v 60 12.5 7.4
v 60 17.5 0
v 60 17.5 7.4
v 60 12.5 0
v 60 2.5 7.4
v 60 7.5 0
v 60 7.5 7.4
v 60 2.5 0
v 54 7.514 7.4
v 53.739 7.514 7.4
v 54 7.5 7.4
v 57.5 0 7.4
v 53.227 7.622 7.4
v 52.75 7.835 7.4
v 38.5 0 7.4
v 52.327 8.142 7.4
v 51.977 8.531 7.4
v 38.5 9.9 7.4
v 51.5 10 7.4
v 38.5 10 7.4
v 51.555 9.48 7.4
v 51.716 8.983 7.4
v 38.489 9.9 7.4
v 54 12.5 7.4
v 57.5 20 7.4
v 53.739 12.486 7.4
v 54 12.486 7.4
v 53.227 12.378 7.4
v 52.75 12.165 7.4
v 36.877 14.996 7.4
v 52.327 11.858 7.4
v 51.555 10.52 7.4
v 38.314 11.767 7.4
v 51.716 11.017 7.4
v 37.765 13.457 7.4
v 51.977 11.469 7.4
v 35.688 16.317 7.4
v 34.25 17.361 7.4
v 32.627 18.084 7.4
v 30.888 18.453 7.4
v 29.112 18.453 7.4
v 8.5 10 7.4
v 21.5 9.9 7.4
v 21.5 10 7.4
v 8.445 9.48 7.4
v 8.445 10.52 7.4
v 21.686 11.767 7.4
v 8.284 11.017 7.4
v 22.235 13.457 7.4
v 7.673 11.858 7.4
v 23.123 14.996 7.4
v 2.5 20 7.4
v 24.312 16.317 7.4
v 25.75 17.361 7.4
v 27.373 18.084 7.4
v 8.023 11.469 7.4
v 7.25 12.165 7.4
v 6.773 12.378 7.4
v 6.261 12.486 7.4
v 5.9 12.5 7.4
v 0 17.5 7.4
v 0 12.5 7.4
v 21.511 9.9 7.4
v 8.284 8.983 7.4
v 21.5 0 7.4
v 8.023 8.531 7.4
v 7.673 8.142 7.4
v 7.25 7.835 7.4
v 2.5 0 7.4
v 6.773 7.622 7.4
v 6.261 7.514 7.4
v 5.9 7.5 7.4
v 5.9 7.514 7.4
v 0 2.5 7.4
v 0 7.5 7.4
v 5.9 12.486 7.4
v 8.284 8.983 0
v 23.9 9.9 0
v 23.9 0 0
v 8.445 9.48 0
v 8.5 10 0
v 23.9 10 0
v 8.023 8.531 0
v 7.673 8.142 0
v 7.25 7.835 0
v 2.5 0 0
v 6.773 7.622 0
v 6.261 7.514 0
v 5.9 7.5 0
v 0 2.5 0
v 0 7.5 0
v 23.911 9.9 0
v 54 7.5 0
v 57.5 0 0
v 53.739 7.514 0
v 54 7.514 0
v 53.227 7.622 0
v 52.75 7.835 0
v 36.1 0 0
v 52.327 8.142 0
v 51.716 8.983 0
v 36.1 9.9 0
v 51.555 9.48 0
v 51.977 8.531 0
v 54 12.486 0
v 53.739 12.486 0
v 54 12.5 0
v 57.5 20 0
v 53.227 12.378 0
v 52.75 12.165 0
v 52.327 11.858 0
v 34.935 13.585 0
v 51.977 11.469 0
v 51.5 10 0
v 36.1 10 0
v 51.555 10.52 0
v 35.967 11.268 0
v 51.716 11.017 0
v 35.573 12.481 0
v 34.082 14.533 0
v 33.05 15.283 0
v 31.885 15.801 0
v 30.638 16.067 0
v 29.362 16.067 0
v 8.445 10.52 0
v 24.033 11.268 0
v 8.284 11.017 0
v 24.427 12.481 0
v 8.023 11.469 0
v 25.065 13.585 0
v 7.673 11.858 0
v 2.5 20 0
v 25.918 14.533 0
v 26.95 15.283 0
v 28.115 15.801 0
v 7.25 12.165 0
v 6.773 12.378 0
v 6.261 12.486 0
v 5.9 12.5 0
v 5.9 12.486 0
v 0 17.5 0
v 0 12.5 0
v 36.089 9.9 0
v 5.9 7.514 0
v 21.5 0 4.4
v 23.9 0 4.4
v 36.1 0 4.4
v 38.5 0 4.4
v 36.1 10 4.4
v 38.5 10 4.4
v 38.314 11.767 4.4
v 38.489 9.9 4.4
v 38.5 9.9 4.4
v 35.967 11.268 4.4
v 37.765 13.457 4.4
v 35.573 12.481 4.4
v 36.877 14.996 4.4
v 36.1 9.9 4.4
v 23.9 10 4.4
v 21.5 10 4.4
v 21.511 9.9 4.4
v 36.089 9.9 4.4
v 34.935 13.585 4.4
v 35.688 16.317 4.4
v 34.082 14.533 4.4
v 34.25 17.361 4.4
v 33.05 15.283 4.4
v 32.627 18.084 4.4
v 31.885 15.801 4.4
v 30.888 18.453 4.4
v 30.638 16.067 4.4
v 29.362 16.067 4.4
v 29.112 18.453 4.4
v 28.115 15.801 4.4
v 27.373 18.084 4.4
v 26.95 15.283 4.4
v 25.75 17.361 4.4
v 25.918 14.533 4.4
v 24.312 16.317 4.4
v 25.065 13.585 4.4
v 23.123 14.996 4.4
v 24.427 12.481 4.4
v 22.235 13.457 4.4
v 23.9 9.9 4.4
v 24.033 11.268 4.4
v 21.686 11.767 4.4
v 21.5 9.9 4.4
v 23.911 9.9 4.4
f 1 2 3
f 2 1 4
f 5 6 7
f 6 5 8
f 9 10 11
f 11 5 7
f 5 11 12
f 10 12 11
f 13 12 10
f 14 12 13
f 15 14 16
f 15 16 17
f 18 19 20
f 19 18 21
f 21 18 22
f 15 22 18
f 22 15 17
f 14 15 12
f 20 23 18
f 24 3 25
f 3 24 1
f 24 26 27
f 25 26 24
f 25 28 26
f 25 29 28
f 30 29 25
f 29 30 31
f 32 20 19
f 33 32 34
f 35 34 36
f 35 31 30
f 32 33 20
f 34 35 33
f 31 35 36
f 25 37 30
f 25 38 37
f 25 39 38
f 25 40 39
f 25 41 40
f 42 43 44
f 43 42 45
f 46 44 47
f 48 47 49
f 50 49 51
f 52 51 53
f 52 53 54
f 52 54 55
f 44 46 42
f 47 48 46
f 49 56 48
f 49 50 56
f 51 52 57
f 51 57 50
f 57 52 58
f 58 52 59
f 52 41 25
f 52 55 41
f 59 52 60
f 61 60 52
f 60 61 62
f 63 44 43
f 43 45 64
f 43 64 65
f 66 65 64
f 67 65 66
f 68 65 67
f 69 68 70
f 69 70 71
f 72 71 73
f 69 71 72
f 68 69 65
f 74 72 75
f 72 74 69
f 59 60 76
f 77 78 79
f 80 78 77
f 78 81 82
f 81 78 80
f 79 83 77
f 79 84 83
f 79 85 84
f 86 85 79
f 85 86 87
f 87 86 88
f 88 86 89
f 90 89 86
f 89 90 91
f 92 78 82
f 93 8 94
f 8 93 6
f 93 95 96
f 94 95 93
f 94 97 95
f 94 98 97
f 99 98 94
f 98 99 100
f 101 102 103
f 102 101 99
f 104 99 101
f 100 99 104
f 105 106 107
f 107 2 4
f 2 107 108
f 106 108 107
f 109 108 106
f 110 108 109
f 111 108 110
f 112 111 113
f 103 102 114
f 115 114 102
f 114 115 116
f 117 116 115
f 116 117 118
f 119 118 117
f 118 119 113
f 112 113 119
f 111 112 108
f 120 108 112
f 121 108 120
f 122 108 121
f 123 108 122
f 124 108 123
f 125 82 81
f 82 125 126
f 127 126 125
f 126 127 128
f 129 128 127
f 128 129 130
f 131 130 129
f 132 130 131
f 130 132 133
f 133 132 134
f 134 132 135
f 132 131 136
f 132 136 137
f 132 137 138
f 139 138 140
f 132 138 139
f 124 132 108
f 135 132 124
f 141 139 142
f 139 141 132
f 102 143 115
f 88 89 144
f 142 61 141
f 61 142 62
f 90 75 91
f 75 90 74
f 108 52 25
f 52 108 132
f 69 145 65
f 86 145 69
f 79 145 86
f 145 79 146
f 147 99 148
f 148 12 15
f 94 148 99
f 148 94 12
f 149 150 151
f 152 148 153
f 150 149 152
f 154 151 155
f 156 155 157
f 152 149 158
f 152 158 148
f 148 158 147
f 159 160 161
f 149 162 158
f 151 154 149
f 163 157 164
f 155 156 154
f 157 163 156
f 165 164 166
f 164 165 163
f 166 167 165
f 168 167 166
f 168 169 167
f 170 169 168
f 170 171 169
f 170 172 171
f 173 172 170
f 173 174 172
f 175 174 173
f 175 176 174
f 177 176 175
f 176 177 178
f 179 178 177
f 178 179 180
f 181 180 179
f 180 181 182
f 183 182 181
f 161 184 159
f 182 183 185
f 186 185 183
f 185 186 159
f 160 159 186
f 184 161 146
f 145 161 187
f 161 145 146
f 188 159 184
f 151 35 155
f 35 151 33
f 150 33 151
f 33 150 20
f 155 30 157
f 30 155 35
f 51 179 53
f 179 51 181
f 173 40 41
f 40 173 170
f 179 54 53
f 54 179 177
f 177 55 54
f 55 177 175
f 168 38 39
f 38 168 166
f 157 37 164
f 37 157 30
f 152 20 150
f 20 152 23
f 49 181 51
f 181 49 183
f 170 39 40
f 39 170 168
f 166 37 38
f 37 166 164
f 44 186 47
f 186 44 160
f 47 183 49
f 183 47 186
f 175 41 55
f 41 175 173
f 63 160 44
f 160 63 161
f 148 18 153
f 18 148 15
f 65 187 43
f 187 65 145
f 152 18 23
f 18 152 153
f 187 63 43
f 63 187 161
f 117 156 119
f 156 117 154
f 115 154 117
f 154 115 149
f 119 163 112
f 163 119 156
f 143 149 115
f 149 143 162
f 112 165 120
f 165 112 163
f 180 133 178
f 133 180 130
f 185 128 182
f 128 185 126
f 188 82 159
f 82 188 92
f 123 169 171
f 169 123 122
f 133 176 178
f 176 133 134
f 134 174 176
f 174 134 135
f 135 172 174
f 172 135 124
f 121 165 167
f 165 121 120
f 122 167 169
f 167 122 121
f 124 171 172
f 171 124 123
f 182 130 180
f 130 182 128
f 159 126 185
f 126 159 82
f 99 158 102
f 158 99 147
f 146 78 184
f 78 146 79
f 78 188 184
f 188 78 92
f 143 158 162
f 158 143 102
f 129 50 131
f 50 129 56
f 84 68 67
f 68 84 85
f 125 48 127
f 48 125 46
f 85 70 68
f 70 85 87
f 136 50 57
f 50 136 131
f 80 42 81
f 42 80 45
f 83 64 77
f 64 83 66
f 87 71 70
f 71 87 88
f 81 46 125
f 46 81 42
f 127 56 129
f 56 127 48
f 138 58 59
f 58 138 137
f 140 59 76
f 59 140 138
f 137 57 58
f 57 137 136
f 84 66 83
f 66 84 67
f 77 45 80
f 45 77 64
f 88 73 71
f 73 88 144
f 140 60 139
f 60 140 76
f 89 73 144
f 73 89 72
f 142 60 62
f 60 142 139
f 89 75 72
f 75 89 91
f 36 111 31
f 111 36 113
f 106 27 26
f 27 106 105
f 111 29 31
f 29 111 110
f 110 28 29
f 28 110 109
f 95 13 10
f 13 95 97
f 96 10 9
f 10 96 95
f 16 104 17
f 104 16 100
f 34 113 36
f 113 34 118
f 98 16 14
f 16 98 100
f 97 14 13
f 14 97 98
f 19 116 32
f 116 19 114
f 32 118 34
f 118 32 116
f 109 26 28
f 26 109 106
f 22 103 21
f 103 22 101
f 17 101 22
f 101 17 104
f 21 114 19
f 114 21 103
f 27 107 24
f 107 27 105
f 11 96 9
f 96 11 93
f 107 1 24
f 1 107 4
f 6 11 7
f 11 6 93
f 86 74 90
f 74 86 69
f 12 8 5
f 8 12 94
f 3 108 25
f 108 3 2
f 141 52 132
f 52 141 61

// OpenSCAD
// RebeliX
//
// j-head mount
// GNU GPL v3
// Martin Neruda
// http://www.reprap4u.cz

difference(){
	cube([60,20,7.4]);
	translate([30,10,4.4]) cylinder(r=8.5,h=3.1,$fn=30);
	translate([30-8.5,-0.1,4.4]) cube([17,10,3.1]);
		
	translate([30,10,-0.1]) cylinder(r=6.1,h=10,$fn=30);
	translate([30-6.1,-0.1,-0.1]) cube([12.2,10,10]);
	
	// Otvory pro prisroubovani
	translate([30-24,10,-0.1]) cylinder(r=2.5,h=10,$fn=30);
	translate([-0.1,10-2.5,-0.1]) cube([6,5,10]);
		
	translate([30+24,10,-0.1]) cylinder(r=2.5,h=10,$fn=30);
	translate([30+24,10-2.5,-0.1]) cube([7,5,10]);
	
	// Seriznute rohy
	translate([2.5,0,-0.1]) rotate([0,0,135]) cube([5,5,10]);
	translate([60-2.5,0,-0.1]) rotate([0,0,-45]) cube([5,5,10]);
	translate([60,20-2.5,-0.1]) rotate([0,0,45]) cube([5,5,10]);
	translate([2.5,20,-0.1]) rotate([0,0,135]) cube([5,5,10]);
}	
